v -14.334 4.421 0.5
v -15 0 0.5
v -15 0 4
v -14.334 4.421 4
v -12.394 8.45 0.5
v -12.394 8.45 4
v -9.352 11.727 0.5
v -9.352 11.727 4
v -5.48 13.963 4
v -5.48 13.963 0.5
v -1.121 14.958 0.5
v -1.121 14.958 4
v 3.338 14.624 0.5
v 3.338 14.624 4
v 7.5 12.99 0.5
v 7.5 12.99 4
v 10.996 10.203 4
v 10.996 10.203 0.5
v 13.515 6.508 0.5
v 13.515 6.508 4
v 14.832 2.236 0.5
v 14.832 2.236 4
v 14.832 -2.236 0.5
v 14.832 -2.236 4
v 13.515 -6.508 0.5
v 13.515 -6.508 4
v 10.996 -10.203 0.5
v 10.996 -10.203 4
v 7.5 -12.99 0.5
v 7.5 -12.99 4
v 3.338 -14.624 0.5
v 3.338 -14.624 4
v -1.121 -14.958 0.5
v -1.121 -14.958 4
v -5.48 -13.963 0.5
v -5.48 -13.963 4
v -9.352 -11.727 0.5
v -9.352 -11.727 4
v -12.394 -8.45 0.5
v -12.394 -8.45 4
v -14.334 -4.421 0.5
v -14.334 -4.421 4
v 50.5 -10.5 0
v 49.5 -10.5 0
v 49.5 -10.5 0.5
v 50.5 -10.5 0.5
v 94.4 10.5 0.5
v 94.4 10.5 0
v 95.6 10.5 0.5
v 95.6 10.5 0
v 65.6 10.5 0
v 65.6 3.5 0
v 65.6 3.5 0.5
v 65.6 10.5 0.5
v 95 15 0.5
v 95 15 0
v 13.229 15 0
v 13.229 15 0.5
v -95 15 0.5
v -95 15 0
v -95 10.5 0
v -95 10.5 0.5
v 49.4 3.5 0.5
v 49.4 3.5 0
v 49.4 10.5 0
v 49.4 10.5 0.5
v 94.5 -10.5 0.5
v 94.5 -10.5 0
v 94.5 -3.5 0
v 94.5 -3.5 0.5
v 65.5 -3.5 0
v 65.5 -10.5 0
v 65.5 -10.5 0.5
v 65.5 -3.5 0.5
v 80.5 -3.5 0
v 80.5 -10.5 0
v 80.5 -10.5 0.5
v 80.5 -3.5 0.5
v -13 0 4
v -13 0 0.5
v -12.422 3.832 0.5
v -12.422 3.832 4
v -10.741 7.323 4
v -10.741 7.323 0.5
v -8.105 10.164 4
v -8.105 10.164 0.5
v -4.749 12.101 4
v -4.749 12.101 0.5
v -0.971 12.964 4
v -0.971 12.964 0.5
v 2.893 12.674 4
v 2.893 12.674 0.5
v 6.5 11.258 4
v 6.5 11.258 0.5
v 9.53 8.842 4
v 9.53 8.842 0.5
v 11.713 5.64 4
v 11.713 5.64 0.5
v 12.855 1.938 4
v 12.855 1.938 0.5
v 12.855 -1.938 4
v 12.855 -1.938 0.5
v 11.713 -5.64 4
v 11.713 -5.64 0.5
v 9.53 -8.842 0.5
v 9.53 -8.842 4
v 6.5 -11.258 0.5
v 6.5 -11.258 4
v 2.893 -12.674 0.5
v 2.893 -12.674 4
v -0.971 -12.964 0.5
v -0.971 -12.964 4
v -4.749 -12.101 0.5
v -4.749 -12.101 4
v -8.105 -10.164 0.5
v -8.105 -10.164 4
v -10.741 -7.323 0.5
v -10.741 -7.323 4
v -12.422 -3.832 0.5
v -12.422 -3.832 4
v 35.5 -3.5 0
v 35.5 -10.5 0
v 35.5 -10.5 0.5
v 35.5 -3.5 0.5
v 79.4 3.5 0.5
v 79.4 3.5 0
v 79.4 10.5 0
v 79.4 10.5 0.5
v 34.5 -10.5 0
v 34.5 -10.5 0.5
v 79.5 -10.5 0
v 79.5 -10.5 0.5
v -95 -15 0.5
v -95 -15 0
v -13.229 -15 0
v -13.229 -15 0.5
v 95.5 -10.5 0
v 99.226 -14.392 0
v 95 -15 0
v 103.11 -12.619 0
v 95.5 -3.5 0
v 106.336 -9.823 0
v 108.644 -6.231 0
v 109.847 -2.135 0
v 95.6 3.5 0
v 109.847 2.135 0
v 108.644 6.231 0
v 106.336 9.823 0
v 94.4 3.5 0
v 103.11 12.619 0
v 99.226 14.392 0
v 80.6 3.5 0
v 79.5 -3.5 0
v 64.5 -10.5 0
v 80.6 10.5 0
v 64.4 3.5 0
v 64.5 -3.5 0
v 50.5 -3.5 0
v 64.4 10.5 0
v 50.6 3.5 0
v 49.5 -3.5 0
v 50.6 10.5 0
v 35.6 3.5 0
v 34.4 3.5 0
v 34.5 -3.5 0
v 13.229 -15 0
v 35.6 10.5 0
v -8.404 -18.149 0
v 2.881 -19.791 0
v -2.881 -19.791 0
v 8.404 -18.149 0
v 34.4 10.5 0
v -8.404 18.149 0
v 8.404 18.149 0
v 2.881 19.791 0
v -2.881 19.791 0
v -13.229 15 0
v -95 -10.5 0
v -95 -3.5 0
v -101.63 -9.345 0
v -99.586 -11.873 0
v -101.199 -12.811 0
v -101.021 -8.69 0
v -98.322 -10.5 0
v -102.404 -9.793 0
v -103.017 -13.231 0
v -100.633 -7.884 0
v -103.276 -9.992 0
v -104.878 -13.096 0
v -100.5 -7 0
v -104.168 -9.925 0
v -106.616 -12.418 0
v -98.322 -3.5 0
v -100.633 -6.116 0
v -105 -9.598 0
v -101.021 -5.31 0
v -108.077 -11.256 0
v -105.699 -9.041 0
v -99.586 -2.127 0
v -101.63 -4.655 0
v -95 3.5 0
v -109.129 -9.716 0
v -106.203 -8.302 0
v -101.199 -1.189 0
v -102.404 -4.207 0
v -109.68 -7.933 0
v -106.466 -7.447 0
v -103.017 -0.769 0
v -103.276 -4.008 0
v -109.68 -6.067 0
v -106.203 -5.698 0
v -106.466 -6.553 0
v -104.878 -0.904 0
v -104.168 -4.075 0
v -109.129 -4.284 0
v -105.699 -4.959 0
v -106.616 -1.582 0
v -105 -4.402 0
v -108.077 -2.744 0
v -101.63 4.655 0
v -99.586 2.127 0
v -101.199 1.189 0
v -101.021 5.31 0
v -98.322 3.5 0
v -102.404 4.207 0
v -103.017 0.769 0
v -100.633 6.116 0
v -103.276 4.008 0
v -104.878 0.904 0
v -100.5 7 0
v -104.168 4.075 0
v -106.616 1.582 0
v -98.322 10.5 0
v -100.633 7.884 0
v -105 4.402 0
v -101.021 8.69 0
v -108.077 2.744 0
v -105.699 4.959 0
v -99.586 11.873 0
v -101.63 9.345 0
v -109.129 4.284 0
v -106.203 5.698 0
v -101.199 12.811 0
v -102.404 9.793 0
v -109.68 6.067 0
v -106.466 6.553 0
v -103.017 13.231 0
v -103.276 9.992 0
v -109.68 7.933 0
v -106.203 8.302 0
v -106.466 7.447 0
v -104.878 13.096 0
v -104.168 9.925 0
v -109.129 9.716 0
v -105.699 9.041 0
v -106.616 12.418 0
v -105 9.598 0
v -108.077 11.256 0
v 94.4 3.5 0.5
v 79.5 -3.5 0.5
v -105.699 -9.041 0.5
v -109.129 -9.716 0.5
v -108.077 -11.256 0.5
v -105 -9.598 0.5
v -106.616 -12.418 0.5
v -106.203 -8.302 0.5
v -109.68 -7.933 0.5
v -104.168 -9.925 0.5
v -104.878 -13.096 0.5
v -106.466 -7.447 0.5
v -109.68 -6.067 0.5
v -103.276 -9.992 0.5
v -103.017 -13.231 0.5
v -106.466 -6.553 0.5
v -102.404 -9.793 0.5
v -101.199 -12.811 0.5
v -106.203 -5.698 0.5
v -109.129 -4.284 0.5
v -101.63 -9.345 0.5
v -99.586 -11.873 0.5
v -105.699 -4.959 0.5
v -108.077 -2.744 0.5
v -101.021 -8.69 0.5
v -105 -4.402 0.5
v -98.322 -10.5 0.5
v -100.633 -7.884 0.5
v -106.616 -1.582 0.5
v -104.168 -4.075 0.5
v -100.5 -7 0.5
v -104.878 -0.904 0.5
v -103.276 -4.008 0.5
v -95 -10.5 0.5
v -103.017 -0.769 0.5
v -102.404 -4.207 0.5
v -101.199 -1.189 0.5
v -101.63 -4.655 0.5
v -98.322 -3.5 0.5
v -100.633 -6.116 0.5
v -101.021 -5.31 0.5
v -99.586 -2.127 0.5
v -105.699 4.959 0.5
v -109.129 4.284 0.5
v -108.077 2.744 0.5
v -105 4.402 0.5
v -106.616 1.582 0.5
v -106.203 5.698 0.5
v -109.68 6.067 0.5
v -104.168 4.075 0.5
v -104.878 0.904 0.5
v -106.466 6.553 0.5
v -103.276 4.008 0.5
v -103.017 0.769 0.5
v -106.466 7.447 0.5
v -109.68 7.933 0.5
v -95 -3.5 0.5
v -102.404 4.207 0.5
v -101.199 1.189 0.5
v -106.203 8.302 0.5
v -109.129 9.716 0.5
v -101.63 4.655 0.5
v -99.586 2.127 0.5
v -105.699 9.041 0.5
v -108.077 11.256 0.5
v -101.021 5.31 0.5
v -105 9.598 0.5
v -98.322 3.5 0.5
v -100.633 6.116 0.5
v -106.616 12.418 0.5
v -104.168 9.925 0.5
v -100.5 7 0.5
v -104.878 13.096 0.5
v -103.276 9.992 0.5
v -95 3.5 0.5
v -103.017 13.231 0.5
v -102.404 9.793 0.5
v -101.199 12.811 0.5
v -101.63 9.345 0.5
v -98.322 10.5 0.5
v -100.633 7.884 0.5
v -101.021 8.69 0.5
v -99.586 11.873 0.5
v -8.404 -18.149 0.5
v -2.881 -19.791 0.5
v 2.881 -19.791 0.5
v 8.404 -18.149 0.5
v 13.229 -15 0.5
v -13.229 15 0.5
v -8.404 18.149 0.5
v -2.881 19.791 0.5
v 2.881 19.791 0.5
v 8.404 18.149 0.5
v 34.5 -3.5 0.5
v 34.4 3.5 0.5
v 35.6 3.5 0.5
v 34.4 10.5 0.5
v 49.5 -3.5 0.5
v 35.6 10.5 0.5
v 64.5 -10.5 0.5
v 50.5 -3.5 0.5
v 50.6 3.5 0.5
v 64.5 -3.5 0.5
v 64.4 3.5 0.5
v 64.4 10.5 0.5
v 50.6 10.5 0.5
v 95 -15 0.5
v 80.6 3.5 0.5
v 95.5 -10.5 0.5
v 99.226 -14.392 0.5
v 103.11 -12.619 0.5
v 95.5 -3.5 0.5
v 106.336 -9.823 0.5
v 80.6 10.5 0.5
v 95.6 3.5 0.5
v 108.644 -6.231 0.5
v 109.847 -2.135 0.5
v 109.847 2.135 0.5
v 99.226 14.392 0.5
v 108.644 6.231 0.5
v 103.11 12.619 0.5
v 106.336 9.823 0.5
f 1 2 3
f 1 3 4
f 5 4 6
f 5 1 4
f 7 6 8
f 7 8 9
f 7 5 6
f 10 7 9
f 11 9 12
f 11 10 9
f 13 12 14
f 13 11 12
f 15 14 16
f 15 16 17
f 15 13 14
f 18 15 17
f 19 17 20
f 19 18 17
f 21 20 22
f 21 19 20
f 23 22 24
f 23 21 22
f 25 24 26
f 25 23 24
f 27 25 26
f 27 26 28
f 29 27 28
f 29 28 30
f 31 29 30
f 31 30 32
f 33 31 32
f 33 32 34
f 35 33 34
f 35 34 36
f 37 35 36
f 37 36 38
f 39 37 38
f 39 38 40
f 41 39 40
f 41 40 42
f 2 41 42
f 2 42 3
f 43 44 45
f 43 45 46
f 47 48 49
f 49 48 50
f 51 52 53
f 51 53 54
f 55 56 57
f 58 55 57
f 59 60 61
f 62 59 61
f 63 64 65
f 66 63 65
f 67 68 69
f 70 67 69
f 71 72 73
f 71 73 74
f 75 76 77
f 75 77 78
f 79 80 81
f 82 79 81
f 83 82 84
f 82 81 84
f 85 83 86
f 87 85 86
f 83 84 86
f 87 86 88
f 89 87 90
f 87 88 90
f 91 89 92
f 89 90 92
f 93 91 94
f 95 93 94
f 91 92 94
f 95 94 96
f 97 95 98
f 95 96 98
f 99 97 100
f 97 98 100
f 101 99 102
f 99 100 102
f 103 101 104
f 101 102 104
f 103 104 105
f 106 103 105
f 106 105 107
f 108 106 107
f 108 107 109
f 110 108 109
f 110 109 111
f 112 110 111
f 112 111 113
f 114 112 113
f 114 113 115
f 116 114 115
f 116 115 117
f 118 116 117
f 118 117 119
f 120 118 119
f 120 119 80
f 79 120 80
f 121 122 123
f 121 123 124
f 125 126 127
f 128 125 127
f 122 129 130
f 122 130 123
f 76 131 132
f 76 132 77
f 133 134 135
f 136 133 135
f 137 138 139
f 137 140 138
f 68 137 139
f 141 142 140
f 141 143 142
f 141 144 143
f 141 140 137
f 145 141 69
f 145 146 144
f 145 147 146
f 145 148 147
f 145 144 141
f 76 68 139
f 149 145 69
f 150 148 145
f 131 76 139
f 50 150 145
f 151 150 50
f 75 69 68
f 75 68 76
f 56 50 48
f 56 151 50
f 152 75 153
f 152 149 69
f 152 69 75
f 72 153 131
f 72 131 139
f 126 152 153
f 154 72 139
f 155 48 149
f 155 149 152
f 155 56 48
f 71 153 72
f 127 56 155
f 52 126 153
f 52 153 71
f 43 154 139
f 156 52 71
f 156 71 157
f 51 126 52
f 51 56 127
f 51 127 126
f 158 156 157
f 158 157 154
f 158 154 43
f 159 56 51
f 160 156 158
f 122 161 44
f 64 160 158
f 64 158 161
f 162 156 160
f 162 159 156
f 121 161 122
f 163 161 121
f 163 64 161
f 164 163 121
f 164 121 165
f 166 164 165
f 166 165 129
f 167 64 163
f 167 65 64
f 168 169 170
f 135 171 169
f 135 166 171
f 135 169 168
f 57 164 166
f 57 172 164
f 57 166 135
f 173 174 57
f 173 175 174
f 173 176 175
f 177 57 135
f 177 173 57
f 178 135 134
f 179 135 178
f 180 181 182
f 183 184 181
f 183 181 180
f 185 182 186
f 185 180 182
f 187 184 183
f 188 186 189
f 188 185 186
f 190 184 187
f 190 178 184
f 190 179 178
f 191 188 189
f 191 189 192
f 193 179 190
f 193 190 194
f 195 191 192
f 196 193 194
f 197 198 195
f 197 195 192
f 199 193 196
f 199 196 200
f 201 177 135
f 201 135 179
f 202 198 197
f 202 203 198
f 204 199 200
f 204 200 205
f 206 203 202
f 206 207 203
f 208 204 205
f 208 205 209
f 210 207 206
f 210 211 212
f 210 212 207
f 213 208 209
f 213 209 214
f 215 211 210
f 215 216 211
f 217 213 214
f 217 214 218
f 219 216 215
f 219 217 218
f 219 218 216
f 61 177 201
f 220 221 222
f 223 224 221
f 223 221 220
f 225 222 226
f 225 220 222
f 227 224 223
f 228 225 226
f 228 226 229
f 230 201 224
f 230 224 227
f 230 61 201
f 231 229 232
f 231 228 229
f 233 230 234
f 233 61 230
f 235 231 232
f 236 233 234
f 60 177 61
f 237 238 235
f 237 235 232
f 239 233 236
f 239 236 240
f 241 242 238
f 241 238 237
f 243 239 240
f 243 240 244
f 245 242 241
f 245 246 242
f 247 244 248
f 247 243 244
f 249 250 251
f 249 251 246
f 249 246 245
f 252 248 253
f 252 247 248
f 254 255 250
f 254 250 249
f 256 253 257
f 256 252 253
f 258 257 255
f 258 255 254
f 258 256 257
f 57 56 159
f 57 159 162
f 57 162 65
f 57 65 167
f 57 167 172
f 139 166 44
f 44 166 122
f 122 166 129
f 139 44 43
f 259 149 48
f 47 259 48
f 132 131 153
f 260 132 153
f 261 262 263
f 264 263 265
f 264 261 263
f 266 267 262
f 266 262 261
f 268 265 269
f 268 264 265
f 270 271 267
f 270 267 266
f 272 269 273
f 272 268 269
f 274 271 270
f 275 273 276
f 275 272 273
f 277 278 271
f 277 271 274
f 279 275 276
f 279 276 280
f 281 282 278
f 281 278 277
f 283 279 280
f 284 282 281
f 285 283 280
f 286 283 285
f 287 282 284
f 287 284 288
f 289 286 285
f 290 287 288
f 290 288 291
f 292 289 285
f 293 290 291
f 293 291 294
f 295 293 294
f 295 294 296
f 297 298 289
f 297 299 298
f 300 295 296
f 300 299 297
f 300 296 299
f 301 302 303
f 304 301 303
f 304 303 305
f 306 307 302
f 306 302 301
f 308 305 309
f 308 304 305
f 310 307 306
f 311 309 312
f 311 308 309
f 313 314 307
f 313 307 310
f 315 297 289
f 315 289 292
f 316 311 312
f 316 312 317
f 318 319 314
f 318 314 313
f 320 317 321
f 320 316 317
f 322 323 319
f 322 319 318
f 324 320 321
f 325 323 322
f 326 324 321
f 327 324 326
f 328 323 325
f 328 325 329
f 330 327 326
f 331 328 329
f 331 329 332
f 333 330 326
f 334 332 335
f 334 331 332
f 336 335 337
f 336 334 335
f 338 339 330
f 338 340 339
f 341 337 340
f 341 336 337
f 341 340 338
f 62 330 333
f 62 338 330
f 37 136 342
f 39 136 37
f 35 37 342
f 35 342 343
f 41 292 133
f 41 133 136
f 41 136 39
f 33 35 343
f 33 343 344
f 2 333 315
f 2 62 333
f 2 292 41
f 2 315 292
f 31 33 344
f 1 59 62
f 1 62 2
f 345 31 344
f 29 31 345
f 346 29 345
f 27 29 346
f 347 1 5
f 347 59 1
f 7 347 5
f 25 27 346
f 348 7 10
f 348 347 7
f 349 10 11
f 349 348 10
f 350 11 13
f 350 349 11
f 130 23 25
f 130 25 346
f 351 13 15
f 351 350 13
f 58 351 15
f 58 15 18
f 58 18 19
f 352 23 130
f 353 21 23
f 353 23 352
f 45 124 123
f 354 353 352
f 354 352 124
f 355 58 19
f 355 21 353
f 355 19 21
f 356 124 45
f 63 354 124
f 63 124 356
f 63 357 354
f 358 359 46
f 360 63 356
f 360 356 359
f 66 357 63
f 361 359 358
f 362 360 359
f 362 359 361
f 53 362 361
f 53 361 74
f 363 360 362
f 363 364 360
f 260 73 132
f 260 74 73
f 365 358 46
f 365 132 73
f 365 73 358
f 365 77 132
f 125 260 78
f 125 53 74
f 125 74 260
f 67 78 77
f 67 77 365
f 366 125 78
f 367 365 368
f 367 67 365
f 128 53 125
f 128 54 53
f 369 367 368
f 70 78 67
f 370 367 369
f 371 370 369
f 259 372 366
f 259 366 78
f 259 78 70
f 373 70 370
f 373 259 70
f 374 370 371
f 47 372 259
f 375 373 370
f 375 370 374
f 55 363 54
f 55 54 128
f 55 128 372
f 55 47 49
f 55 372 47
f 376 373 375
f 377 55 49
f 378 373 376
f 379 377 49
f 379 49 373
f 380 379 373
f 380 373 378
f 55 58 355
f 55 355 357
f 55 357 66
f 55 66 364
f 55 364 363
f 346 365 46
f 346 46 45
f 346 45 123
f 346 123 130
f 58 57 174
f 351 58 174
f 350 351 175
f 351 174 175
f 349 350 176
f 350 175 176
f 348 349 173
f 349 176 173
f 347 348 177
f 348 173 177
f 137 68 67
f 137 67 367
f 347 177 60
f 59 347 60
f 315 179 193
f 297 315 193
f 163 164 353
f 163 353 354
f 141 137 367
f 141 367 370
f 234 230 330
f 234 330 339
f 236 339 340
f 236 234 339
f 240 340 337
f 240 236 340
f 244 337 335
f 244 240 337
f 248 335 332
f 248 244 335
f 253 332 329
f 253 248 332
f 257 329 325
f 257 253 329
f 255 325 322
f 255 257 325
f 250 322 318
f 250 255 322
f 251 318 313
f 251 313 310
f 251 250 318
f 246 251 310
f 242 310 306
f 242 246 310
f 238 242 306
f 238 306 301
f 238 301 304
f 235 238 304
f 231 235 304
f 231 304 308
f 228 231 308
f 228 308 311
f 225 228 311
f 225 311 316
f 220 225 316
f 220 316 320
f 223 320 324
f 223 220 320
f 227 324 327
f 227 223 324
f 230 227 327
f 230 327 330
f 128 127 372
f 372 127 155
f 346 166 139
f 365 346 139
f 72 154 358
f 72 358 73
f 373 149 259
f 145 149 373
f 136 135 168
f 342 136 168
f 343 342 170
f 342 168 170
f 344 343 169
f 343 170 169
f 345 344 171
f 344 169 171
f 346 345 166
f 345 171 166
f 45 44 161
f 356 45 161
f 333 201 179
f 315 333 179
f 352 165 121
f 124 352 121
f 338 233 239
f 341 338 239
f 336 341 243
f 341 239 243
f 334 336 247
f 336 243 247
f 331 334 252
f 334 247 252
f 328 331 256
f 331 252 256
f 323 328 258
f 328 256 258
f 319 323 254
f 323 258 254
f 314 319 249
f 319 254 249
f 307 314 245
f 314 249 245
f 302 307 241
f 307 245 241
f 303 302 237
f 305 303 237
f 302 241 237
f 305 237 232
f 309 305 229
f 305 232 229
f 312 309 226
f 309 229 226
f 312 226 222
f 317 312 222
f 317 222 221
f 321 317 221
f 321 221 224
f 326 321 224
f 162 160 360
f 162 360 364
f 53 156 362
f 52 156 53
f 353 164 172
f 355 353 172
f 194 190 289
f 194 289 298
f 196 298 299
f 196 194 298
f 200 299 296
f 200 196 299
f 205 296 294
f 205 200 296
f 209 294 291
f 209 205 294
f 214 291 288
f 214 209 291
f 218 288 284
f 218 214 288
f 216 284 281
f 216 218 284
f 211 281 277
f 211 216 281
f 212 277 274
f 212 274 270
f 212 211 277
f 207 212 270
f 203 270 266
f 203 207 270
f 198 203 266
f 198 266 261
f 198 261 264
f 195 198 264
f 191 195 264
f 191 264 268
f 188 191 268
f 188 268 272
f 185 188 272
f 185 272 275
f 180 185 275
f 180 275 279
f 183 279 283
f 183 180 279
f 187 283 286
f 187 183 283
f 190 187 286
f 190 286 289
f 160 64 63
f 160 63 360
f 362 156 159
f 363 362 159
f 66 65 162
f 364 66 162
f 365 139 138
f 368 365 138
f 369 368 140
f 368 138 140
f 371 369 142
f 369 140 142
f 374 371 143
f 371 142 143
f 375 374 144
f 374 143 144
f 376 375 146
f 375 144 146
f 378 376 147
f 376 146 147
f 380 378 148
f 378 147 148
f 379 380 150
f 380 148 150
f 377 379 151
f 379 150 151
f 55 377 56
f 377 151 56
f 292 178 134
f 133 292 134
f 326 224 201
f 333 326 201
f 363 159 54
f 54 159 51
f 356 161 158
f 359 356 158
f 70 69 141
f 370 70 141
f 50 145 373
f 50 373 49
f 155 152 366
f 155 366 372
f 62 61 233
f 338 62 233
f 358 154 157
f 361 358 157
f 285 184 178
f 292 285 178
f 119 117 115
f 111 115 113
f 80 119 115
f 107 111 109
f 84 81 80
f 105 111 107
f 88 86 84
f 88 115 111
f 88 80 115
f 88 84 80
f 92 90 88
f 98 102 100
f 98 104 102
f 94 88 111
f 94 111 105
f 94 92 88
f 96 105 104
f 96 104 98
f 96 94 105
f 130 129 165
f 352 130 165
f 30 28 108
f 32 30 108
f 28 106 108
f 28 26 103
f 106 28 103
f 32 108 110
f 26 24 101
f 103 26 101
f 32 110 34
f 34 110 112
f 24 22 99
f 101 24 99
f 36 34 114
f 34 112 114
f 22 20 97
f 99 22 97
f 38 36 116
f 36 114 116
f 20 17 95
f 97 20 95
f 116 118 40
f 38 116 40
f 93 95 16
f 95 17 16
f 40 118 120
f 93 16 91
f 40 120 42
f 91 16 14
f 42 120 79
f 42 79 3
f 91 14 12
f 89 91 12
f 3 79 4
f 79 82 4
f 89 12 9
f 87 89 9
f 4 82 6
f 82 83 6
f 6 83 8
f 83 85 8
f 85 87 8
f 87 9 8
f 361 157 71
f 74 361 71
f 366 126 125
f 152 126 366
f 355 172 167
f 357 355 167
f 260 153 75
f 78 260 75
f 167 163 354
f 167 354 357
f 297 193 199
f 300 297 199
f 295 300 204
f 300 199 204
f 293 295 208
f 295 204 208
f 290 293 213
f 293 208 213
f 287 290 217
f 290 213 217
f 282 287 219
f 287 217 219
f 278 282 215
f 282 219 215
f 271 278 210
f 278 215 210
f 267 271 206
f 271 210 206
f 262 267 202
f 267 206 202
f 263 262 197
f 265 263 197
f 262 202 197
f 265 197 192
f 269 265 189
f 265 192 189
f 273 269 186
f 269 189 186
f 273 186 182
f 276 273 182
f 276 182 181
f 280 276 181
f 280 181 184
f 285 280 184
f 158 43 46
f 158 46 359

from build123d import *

# Parameters (mm, degrees)
SKETCH_1_W      = 1
SKETCH_1_H      = 7
SKETCH_1_W_2    = 1.2
SKETCH_1_R      = 3
EXTRUDE_2_DEPTH = 0.5
SKETCH_3_R      = 15
SKETCH_3_R_2    = 13
EXTRUDE_3_DEPTH = 4


with BuildPart() as part:
    # Эскиз1 → Бобышка-Вытянуть2 (new body)
    with BuildSketch(Plane.XY):
        with BuildLine():
            Line((95, 15), (13.228756555, 15))
            ThreePointArc((13.228756555, 15), (0, 20), (-13.228756555, 15))
            Line((-13.228756555, 15), (-95, 15))
            Line((-95, 15), (-95, 10.5))
            Line((-95, 10.5), (-98.321921206, 10.5))
            ThreePointArc((-98.321921206, 10.5), (-109.75, 7), (-98.321921206, 3.5))
            Line((-98.321921206, 3.5), (-95, 3.5))
            Line((-95, 3.5), (-95, -3.5))
            Line((-95, -3.5), (-98.321921206, -3.5))
            ThreePointArc((-98.321921206, -3.5), (-109.75, -7), (-98.321921206, -10.5))
            Line((-98.321921206, -10.5), (-95, -10.5))
            Line((-95, -10.5), (-95, -15))
            Line((-95, -15), (-13.228756555, -15))
            ThreePointArc((-13.228756555, -15), (0, -20), (13.228756555, -15))
            Line((13.228756555, -15), (95, -15))
            ThreePointArc((95, -15), (110, 0), (95, 15))
        make_face()
        with Locations((35, -7)):
            Rectangle(SKETCH_1_W, SKETCH_1_H, mode=Mode.SUBTRACT)
        with Locations((50, -7)):
            Rectangle(SKETCH_1_W, SKETCH_1_H, mode=Mode.SUBTRACT)
        with Locations((65, -7)):
            Rectangle(SKETCH_1_W, SKETCH_1_H, mode=Mode.SUBTRACT)
        with Locations((80, -7)):
            Rectangle(SKETCH_1_W, SKETCH_1_H, mode=Mode.SUBTRACT)
        with Locations((95, -7)):
            Rectangle(SKETCH_1_W, SKETCH_1_H, mode=Mode.SUBTRACT)
        with Locations((35, 7)):
            Rectangle(SKETCH_1_W_2, SKETCH_1_H, mode=Mode.SUBTRACT)
        with Locations((50, 7)):
            Rectangle(SKETCH_1_W_2, SKETCH_1_H, mode=Mode.SUBTRACT)
        with Locations((65, 7)):
            Rectangle(SKETCH_1_W_2, SKETCH_1_H, mode=Mode.SUBTRACT)
        with Locations((80, 7)):
            Rectangle(SKETCH_1_W_2, SKETCH_1_H, mode=Mode.SUBTRACT)
        with Locations((95, 7)):
            Rectangle(SKETCH_1_W_2, SKETCH_1_H, mode=Mode.SUBTRACT)
        with Locations((-103.5, 7)):
            Circle(SKETCH_1_R, mode=Mode.SUBTRACT)
        with Locations((-103.5, -7)):
            Circle(SKETCH_1_R, mode=Mode.SUBTRACT)
    extrude(amount=EXTRUDE_2_DEPTH)

    # Эскиз3 → Бобышка-Вытянуть3 (add)
    with BuildSketch(Plane(origin=(0, 0, 0), x_dir=(-1, 0, 0), z_dir=(0, 0, -1))):
        Circle(SKETCH_3_R)
        Circle(SKETCH_3_R_2, mode=Mode.SUBTRACT)
    extrude(amount=-EXTRUDE_3_DEPTH)


solid = part.part
